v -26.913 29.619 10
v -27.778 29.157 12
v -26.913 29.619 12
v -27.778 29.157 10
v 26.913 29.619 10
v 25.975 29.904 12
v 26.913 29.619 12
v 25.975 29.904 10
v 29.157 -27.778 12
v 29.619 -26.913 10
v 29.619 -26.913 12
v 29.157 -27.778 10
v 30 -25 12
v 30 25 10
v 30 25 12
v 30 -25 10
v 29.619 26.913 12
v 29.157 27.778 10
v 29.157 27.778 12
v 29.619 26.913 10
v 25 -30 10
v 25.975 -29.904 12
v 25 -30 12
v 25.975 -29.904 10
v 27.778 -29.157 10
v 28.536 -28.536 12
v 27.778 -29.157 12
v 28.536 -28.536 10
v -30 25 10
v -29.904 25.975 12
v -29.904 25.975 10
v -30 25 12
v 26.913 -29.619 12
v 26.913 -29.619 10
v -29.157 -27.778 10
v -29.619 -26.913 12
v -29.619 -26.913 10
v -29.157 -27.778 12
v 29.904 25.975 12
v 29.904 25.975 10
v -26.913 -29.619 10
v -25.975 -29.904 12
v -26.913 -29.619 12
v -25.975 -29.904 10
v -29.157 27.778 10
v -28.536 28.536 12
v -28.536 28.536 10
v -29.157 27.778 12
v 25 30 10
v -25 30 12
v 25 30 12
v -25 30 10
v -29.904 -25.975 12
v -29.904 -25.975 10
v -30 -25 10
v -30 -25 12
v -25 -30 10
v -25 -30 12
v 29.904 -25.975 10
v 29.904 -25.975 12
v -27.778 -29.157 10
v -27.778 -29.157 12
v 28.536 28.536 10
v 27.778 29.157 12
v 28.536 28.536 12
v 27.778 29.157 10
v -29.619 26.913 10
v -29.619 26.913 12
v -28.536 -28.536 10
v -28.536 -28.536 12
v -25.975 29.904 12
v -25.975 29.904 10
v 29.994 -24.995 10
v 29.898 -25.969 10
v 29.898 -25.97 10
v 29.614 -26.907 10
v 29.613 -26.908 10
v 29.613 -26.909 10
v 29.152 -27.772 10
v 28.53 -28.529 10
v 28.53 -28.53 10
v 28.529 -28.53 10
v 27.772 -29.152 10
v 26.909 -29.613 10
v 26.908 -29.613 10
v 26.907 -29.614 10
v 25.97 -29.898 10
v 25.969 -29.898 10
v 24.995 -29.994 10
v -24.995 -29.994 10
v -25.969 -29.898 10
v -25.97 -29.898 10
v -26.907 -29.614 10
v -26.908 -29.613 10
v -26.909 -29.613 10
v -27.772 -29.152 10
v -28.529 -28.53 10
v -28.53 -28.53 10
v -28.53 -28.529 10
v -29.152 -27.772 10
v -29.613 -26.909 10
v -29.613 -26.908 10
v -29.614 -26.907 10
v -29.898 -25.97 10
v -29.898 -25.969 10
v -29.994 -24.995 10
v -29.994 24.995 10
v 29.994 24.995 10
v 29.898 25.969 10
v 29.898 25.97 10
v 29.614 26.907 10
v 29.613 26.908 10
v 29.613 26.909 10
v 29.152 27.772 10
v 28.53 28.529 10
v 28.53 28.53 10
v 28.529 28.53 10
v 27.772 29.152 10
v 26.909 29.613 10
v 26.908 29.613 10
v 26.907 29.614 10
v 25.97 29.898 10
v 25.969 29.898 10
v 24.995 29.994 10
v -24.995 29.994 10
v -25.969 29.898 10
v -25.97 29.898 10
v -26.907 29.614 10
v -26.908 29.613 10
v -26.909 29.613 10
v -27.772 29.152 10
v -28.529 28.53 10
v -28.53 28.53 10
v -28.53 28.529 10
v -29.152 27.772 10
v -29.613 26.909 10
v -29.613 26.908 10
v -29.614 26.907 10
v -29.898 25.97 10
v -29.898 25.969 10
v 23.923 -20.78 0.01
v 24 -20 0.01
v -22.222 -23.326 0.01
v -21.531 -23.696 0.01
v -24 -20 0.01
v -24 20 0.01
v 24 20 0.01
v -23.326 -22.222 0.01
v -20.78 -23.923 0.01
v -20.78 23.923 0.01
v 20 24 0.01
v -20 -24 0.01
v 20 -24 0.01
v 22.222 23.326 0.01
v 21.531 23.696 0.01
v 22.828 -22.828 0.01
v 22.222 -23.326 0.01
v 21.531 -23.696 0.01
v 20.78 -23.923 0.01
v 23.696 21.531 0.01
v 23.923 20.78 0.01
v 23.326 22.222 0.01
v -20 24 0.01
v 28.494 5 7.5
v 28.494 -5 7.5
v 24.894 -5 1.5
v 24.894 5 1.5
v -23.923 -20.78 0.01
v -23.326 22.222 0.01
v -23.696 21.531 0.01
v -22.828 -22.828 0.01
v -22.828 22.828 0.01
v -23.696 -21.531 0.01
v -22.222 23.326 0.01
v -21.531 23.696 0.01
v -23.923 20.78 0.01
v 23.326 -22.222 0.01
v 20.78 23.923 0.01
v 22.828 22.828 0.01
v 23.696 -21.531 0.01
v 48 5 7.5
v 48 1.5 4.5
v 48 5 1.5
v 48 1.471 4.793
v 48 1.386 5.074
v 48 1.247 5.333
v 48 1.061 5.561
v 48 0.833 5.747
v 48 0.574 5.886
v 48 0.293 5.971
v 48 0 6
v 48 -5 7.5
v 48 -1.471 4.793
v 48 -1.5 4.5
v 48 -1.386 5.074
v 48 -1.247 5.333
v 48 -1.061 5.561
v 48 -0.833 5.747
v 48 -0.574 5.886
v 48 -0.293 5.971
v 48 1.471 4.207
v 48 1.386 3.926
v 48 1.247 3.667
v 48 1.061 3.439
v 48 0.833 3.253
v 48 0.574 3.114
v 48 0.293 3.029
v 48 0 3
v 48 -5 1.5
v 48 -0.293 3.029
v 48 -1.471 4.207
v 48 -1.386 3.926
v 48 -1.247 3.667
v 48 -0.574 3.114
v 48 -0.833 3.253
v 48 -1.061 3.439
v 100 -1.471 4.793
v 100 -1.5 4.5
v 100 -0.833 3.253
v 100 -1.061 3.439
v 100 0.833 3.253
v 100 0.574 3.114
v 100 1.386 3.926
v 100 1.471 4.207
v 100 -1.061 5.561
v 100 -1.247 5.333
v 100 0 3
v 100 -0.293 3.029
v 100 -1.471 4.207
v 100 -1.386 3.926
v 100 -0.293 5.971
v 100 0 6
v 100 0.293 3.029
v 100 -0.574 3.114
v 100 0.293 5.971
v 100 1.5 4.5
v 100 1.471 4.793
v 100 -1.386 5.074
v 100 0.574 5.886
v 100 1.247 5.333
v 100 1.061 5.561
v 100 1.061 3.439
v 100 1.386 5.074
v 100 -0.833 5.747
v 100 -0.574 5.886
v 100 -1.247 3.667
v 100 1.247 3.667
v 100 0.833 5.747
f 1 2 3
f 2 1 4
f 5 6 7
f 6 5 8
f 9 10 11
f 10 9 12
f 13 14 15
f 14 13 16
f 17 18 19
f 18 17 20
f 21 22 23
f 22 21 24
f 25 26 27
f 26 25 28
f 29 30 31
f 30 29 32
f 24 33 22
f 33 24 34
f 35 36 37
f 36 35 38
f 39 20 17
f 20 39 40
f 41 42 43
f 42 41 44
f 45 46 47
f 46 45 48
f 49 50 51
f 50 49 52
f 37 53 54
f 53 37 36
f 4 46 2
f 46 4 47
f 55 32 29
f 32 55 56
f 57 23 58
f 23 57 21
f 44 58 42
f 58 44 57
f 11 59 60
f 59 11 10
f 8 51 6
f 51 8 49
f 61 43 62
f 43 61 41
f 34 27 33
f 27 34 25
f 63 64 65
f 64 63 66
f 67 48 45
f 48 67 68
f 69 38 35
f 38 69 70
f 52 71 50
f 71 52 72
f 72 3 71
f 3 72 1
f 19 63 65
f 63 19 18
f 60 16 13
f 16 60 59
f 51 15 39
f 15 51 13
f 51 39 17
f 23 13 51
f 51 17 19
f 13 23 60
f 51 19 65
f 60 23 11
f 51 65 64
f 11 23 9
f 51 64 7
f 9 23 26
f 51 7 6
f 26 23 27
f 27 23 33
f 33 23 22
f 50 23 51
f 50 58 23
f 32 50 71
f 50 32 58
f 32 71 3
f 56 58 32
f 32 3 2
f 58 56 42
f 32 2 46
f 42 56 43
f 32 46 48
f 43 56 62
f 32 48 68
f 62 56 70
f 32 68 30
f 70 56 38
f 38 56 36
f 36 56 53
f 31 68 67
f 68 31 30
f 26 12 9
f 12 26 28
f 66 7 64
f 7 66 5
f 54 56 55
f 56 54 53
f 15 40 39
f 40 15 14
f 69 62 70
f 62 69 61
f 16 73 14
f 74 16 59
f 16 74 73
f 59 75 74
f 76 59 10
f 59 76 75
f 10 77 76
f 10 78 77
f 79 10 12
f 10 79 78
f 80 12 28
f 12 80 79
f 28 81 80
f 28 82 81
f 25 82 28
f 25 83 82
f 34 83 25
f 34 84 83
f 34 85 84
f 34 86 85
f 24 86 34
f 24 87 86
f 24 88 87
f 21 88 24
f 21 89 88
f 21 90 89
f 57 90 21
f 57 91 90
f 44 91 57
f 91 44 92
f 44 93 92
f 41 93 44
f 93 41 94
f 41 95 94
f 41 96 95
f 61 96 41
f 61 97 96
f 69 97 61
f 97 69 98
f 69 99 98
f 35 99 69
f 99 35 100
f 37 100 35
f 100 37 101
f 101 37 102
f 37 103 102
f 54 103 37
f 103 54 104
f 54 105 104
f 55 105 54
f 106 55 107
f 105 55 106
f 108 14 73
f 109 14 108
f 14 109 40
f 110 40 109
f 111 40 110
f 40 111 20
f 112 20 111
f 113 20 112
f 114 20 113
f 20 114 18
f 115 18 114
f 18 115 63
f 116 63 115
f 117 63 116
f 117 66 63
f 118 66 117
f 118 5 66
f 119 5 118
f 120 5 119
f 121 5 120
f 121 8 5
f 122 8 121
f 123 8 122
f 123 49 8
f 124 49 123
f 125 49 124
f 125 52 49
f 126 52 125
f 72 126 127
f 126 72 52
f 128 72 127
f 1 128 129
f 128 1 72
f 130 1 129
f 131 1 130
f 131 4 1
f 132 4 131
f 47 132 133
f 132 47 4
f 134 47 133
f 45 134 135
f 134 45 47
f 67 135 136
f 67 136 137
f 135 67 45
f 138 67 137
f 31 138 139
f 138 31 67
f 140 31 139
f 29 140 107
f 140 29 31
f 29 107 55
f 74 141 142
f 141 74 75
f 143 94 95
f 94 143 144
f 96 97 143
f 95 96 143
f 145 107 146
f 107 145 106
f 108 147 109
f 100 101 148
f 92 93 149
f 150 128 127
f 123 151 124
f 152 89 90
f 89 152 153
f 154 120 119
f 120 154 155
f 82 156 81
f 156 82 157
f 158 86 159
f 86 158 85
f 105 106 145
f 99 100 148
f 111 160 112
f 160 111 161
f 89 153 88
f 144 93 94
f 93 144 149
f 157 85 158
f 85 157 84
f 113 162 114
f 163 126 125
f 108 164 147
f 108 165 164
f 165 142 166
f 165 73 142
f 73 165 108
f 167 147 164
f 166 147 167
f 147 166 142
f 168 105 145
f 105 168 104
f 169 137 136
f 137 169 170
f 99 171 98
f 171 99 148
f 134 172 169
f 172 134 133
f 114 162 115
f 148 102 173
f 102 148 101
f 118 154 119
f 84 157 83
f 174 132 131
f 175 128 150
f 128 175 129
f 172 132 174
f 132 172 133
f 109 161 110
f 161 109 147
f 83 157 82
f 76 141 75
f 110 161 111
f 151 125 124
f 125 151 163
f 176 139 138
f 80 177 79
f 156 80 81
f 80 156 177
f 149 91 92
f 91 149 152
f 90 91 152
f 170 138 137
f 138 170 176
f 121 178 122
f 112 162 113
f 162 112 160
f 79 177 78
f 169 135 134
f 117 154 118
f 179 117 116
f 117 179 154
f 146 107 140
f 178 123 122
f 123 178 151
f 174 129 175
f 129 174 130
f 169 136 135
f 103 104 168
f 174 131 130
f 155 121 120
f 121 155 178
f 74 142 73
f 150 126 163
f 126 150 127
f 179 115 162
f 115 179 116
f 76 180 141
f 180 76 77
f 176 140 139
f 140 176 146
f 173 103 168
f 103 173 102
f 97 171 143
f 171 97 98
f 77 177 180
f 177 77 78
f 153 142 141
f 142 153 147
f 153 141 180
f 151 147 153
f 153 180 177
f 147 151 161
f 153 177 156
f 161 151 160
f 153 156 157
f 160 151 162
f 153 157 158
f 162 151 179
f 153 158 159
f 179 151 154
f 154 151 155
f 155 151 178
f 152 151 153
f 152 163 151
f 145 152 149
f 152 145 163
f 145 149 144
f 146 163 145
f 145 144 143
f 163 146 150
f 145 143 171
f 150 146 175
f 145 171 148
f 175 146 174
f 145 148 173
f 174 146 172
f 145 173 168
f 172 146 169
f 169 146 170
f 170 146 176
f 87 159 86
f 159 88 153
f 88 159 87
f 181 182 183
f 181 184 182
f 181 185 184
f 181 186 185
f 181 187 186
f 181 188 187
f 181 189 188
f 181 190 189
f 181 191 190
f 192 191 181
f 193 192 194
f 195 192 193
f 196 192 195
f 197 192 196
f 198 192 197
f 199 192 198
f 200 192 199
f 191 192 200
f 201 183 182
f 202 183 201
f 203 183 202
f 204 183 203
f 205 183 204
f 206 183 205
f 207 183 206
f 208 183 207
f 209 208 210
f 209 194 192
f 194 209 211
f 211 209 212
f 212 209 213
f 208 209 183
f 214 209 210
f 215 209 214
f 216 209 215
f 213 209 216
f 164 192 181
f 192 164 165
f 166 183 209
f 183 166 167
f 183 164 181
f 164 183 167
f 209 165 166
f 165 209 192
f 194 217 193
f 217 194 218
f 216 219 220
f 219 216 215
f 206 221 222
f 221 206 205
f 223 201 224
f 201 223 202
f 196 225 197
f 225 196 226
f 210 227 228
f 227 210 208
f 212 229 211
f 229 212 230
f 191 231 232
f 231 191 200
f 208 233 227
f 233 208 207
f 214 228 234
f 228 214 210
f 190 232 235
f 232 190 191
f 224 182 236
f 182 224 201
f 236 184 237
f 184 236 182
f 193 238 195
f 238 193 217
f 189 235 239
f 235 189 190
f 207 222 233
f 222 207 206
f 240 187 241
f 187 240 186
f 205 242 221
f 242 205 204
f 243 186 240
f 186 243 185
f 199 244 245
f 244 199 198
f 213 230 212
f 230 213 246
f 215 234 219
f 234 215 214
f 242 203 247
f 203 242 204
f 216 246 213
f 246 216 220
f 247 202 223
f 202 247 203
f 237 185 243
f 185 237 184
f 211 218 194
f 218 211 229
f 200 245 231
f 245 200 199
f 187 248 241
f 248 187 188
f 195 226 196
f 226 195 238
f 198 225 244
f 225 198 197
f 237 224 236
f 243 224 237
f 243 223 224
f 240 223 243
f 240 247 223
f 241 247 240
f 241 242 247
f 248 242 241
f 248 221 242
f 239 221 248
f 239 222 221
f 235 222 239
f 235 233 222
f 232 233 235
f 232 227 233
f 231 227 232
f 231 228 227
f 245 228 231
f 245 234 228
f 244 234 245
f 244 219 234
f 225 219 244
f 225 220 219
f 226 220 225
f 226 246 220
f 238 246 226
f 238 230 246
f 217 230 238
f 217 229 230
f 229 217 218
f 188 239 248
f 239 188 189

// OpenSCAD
// file: utils.scad
module round_square(size,rad){
	union()
	{
		square([size,size-2*rad], center=true);
		square([size-2*rad,size], center=true);
		translate([size/2-rad,size/2-rad])
			circle(r=rad);
		translate([-size/2+rad,size/2-rad])
			circle(r=rad);
		translate([-size/2+rad,-size/2+rad])
			circle(r=rad);
		translate([size/2-rad,-size/2+rad])
			circle(r=rad);
	}
}

module cubeX( size, radius=1, rounded=true, center=false )
{
	l = len( size );
	if( l == undef )
		_cubeX( size, size, size, radius, rounded, center );
	else
		_cubeX( size[0], size[1], size[2], radius, rounded, center );
}

module _cubeX( x, y, z, r, rounded, center )
{
	if( rounded )
		if( center )
			translate( [-x/2, -y/2, -z/2] )
			__cubeX( x, y, z, r );
		else
			__cubeX( x, y, z, r );
	else
		cube( [x, y, z], center );
}

module __cubeX(	x, y, z, r )
{
	//TODO: discount r.
	rC = r;
	hull()
	{
		translate( [rC, rC, rC] )
			sphere( r );
		translate( [rC, y-rC, rC] )
			sphere( r );
		translate( [rC, rC, z-rC] )
			sphere( r );
		translate( [rC, y-rC, z-rC] )
			sphere( r );

		translate( [x-rC, rC, rC] )
			sphere( r );
		translate( [x-rC, y-rC, rC] )
			sphere( r );
		translate( [x-rC, rC, z-rC] )
			sphere( r );
		translate( [x-rC, y-rC, z-rC] )
			sphere( r );
	}
}
// main file
$fn=32;
include <utils.scad>;

module charger()
{
	top=60;
	height=12;
	topheight=2;
	toprad=5;
   botheight=height-topheight;
	translate([0,0,botheight])
	union(){
		linear_extrude(height = topheight, center = false, convexity = 10, twist = 0, slices = 2, scale = 1)
				round_square(top,toprad);
		translate([0,0,0.01])
		rotate([180,0,0])
			linear_extrude(height = botheight, center = false, convexity = 10, twist = 0, slices = 2, scale = 0.8)
				round_square(top,toprad);
		translate([0,-5,-8.5])
		cube([48,10,6],center=false);
		translate([0,0,-5.5])
		rotate([0,90,0])
		cylinder(h=100, r1=1.5, r2=1.5);
	}
}

charger();
//round_square(60,5);
